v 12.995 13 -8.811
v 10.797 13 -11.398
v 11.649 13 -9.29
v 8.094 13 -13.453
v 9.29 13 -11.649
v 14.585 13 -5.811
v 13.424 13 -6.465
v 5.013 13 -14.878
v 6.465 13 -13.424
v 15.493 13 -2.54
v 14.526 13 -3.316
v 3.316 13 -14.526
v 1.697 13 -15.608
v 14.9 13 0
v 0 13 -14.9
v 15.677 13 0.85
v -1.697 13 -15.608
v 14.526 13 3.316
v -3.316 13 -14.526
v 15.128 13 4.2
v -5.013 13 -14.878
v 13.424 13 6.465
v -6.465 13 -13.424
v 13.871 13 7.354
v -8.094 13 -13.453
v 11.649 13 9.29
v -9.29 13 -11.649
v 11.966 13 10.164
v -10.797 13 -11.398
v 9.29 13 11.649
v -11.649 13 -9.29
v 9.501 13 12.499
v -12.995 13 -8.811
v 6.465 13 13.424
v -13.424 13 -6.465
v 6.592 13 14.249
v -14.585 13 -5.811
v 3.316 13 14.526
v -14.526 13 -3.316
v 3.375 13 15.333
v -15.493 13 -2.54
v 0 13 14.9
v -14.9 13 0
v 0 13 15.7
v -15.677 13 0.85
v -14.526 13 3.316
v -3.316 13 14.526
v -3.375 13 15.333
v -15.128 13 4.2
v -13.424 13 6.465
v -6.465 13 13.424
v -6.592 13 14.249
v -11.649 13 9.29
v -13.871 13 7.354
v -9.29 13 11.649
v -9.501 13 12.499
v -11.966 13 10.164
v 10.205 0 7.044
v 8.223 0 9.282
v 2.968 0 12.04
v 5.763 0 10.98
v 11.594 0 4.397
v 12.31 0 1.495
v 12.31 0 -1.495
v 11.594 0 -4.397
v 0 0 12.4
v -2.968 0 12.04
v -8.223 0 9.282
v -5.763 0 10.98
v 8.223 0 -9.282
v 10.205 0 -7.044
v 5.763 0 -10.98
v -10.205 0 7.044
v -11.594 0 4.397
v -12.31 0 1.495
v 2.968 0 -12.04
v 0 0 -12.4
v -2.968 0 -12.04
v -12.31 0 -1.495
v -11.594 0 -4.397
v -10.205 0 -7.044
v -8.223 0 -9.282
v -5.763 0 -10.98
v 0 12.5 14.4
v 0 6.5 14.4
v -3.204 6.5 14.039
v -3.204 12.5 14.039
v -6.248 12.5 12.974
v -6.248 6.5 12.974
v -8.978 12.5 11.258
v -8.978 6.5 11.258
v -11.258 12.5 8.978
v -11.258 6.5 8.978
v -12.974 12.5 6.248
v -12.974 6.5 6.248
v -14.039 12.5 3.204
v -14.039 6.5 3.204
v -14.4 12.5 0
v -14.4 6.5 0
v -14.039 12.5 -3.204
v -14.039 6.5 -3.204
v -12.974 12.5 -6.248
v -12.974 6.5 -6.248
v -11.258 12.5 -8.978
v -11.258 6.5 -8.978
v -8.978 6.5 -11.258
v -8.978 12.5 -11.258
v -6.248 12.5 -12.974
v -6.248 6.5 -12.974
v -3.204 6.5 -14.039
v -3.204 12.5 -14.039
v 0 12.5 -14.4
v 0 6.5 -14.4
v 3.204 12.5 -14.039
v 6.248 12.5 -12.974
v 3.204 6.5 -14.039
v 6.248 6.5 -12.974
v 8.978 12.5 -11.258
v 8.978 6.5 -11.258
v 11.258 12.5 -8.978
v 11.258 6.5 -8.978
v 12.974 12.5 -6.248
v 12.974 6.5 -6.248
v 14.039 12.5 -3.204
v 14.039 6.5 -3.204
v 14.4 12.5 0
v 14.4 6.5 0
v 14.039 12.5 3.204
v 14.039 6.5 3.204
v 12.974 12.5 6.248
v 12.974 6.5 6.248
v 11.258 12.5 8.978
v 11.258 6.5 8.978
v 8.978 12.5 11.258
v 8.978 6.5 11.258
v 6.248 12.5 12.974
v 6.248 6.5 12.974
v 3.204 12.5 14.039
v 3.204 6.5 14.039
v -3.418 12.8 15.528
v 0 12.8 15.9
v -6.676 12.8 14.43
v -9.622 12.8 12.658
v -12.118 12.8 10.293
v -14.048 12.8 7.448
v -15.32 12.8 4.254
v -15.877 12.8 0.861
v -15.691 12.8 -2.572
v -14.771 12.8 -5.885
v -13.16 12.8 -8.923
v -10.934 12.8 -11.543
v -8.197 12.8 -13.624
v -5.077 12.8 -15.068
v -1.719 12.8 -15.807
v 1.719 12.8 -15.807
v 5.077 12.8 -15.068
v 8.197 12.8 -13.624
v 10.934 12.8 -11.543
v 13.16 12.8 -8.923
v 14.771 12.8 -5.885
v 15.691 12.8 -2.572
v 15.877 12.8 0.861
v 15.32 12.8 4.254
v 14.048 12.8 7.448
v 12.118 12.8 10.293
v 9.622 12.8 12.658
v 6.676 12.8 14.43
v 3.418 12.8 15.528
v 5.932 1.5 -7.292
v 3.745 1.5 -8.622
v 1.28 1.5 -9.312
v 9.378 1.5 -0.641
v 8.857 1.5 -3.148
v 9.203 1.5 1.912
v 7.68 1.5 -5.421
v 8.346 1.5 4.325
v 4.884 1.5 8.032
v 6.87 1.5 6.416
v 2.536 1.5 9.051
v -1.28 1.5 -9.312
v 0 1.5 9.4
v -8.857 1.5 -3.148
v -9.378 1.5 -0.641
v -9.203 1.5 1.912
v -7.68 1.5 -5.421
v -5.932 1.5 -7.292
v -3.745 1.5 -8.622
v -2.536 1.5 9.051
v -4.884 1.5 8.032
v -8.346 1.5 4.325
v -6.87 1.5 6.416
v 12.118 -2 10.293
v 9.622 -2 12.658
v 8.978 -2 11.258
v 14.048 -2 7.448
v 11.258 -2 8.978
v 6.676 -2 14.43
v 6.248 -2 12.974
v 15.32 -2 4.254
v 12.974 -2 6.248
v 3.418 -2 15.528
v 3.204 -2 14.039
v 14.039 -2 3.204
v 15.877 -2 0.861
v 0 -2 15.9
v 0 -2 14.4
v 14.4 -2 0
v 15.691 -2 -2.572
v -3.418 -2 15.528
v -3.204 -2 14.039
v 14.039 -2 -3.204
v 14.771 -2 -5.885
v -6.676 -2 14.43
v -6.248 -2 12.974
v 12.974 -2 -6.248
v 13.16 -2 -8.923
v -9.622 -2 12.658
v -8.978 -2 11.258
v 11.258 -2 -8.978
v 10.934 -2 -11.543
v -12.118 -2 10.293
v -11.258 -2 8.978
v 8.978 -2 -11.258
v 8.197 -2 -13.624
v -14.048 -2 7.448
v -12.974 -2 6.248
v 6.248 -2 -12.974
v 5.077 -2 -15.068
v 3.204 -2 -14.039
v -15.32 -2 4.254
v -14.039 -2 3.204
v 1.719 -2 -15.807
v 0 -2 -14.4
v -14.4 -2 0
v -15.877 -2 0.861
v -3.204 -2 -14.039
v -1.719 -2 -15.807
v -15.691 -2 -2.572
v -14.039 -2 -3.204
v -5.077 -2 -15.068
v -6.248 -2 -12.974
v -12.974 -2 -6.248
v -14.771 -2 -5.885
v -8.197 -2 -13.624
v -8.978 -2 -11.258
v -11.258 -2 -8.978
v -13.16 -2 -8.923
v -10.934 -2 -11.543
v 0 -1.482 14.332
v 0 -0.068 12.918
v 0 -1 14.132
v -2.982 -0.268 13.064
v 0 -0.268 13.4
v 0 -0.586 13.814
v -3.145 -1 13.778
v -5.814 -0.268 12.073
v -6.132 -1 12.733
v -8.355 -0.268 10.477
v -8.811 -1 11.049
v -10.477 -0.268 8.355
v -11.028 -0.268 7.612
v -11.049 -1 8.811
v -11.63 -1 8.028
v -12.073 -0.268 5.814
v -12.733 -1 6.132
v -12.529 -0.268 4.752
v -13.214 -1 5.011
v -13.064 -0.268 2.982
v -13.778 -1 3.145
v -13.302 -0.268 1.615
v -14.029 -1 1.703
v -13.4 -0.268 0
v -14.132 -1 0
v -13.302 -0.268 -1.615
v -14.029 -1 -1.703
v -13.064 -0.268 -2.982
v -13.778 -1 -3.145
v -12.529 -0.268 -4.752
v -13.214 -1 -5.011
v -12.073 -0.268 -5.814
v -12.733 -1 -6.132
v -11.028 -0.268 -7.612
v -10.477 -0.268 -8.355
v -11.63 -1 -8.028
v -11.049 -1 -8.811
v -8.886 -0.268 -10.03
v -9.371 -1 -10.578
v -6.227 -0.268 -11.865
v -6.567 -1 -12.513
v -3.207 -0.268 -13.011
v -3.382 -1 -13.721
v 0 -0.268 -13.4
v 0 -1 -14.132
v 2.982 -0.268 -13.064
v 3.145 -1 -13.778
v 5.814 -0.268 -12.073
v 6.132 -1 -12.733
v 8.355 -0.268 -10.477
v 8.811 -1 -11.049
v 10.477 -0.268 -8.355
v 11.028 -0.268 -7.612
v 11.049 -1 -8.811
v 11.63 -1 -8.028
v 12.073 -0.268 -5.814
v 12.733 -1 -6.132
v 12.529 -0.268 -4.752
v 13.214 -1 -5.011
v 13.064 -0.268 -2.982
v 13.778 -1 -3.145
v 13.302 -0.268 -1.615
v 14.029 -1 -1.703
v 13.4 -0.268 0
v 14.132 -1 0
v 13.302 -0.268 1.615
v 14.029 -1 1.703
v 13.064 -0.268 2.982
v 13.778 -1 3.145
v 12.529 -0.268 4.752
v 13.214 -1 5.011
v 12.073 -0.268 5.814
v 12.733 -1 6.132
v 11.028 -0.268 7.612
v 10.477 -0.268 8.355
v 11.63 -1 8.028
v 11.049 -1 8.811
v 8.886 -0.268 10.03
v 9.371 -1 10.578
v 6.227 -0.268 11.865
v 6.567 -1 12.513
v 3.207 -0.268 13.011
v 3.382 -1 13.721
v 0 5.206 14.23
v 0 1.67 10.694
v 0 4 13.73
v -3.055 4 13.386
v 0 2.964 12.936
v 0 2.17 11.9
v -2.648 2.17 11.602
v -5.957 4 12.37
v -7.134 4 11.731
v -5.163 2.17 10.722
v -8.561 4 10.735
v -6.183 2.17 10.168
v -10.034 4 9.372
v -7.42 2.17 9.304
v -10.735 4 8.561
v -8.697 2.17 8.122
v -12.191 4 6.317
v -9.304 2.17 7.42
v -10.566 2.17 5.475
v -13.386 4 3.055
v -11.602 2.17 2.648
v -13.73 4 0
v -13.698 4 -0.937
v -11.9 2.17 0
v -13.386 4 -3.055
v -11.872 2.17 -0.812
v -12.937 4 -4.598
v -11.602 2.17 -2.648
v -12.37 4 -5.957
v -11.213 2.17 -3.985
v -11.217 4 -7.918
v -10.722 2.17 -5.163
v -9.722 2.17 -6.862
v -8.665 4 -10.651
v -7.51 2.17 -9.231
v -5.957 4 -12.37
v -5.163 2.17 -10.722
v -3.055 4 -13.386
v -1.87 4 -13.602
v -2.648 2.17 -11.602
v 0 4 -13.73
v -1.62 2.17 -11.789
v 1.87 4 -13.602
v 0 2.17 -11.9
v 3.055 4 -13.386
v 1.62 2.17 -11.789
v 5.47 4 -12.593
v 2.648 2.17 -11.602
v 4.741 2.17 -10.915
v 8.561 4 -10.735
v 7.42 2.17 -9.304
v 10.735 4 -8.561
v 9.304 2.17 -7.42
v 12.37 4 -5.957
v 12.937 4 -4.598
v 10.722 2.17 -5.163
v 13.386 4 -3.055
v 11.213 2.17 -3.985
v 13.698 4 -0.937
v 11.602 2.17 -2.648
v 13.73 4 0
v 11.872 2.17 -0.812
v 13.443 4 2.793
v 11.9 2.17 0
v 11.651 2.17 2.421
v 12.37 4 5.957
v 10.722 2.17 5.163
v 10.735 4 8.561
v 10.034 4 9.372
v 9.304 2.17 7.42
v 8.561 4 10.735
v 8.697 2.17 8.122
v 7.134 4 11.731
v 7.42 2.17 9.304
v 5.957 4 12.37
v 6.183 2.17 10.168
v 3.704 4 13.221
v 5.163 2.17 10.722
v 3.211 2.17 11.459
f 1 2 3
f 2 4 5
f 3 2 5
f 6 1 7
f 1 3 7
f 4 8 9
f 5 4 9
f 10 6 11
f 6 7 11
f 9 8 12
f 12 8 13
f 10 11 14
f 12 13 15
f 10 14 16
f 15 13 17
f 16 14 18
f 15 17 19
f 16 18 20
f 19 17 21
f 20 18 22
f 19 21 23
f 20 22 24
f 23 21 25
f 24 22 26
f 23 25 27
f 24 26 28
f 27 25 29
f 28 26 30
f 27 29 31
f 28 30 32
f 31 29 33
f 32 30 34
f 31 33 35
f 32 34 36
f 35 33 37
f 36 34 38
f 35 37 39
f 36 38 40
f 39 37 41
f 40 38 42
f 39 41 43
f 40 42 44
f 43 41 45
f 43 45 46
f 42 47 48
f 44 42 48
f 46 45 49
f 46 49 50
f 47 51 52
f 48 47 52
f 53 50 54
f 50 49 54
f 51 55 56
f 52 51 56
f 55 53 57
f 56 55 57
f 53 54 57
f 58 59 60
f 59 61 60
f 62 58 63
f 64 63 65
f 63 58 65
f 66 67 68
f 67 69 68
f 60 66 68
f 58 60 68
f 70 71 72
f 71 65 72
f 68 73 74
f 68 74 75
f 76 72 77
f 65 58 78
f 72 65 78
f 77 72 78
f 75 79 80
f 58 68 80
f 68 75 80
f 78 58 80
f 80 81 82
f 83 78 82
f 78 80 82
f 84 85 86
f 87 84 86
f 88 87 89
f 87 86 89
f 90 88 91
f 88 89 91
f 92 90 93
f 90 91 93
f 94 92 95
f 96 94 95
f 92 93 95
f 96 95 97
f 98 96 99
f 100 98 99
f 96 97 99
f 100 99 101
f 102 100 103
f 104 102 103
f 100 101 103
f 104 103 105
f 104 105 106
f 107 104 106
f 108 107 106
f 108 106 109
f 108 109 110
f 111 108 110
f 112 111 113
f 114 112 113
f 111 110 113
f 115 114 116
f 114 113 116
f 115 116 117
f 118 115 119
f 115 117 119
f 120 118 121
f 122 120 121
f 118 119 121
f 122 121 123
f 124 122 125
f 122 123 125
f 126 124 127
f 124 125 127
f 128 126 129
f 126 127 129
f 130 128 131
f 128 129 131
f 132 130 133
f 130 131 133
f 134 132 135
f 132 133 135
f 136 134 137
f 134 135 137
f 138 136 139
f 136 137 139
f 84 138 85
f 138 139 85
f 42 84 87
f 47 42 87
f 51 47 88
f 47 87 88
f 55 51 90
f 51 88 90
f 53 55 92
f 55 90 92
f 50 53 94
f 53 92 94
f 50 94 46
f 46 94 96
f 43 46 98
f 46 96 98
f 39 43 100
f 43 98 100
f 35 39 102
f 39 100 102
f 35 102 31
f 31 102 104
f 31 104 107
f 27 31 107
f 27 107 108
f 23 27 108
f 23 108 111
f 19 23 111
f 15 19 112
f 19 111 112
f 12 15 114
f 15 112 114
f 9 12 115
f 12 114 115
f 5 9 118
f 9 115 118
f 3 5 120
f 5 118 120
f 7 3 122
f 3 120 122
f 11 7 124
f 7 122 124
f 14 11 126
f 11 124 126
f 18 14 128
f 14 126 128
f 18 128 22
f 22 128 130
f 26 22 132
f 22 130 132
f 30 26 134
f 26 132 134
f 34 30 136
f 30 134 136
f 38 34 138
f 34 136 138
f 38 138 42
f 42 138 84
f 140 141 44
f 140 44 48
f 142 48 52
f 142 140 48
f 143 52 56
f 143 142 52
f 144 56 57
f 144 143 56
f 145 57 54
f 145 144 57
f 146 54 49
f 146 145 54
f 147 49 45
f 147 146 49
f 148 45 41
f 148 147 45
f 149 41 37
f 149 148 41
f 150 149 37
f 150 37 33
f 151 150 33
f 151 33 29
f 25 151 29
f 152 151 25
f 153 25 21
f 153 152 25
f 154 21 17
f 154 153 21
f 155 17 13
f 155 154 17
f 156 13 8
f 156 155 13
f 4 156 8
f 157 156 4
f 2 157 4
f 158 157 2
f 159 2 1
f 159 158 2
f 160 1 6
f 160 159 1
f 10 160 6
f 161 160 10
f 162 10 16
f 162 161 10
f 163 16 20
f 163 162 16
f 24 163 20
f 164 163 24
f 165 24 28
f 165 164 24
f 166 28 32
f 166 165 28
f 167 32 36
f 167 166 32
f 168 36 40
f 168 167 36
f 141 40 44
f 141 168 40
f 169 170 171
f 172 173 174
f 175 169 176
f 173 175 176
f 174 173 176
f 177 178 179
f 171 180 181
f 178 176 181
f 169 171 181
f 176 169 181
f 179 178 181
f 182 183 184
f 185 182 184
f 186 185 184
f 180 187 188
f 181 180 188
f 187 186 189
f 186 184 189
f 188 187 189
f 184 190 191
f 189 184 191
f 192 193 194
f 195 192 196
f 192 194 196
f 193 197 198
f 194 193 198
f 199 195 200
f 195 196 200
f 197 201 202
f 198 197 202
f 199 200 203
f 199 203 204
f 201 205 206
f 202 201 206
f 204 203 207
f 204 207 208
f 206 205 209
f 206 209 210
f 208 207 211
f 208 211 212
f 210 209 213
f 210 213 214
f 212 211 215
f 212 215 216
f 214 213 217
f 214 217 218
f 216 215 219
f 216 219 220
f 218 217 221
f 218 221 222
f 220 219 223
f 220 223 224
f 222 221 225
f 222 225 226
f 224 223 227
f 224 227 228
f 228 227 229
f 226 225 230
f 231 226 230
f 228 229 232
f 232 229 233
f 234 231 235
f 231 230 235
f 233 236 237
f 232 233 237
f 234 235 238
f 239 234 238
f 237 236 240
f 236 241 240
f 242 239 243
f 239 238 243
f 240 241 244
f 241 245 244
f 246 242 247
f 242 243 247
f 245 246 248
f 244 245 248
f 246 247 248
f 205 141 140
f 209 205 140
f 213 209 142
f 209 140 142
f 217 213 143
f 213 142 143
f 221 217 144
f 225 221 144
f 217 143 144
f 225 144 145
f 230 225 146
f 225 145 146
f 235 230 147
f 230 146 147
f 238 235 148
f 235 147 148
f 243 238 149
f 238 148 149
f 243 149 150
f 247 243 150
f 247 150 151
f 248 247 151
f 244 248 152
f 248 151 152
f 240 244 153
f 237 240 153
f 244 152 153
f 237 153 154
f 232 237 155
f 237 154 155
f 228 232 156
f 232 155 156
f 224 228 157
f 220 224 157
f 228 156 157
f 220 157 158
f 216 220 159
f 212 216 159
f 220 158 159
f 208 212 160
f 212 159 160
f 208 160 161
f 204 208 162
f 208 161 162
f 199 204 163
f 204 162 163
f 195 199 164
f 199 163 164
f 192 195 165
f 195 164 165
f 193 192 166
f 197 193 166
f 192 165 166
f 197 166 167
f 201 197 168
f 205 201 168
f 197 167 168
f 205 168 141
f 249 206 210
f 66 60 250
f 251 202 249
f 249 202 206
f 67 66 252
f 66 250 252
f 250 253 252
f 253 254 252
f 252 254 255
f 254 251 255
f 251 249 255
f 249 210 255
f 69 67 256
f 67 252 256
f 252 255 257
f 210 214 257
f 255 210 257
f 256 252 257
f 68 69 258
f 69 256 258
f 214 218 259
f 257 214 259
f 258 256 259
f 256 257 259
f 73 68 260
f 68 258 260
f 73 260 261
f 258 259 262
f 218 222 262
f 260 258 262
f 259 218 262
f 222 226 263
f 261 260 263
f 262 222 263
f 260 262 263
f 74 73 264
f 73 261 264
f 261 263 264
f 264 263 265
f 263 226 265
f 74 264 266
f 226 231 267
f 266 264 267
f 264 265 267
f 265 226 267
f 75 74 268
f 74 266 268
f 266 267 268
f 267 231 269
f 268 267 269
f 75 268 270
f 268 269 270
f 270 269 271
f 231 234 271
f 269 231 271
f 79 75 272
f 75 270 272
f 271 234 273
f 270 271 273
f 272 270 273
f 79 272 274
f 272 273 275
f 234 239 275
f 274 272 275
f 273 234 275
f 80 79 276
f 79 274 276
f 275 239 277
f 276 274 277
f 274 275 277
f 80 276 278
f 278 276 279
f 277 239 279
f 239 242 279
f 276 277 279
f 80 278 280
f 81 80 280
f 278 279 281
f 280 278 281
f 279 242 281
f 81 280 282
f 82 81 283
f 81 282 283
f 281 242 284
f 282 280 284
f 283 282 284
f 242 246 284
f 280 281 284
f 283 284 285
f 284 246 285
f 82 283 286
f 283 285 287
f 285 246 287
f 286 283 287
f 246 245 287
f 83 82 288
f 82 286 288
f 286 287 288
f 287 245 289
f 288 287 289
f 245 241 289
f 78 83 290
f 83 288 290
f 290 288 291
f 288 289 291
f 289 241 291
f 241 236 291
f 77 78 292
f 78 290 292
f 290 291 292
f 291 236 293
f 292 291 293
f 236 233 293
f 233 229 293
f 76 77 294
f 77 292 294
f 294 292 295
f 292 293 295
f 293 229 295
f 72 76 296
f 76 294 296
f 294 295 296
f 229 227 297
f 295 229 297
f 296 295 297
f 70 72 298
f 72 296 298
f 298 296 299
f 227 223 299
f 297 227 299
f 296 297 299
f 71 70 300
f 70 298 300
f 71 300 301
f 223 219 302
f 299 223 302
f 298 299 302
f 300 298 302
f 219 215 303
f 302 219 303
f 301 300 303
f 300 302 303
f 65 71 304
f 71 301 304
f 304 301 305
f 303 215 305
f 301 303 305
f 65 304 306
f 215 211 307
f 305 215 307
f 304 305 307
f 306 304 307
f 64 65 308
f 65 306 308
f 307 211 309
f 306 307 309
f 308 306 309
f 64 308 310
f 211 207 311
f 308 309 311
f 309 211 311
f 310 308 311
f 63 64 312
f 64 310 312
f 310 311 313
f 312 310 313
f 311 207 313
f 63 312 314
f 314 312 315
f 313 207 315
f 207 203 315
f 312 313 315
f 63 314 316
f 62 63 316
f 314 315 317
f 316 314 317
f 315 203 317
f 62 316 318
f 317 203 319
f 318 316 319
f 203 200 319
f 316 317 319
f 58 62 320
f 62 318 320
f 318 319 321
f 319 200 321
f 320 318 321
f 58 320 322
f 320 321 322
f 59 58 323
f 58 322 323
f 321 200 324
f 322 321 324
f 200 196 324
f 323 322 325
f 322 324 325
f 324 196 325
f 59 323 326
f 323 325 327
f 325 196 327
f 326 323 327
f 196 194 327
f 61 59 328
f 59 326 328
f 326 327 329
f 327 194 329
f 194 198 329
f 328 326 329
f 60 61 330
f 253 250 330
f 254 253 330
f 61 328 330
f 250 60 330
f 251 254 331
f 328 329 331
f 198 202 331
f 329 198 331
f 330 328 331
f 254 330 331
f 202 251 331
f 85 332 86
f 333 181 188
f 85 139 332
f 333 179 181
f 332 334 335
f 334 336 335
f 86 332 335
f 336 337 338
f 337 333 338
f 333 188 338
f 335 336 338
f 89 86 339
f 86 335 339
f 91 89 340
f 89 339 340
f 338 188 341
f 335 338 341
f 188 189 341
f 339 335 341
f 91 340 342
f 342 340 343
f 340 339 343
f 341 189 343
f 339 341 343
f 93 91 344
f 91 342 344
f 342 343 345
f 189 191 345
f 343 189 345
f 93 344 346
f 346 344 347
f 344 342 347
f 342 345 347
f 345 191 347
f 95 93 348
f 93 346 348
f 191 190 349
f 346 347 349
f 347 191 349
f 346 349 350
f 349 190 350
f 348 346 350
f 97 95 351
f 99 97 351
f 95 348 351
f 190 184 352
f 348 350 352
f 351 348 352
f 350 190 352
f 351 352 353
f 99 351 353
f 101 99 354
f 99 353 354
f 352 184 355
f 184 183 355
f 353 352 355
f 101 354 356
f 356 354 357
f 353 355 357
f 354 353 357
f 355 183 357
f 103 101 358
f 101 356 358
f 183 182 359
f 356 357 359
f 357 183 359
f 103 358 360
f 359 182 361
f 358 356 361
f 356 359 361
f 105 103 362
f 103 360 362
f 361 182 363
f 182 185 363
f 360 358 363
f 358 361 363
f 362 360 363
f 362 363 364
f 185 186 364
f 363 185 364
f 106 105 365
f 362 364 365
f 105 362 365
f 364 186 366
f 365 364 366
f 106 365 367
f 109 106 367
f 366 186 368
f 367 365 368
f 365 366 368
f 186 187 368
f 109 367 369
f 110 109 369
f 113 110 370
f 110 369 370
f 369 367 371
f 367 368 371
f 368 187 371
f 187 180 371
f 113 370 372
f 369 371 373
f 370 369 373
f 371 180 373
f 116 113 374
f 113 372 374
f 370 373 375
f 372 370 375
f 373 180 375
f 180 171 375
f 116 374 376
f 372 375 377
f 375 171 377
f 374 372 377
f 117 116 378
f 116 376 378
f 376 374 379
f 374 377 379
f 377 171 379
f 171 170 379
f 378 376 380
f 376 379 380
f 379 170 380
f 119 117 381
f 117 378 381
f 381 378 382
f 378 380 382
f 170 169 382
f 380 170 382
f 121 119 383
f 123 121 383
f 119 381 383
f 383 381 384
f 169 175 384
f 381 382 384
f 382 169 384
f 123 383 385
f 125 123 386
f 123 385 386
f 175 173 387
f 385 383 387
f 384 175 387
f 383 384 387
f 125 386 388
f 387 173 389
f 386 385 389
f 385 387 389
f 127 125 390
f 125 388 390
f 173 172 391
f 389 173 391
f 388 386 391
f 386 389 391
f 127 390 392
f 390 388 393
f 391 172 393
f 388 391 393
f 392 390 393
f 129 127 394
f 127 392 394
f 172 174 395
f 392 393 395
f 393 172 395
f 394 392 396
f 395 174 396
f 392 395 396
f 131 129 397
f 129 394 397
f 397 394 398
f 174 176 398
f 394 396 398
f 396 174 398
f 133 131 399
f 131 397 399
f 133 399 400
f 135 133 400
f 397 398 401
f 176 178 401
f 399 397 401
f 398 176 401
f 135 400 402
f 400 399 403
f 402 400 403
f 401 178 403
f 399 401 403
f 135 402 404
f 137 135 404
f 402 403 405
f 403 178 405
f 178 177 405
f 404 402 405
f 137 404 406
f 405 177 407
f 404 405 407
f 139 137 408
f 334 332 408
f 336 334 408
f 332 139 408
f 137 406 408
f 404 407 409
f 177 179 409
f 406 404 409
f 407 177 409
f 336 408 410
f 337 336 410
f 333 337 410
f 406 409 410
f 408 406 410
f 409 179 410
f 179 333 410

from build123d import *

# Parameters (mm, degrees)
CHAMFER1_SIZE = 0.5
CHAMFER2_SIZE = 0.2


with BuildPart() as part:
    # Sketch1 → Revolve1 (revolve)
    with BuildSketch(Plane.XY, mode=Mode.PRIVATE) as revolve1_sk:
        with BuildLine():
            Line((0, 0), (-12.4, 0))
            ThreePointArc((-12.4, 0), (-13.814213562, -0.585786438), (-14.4, -2))
            Line((-14.4, -2), (-15.9, -2))
            Line((-15.9, -2), (-15.9, 13))
            Line((-15.9, 13), (-14.4, 13))
            Line((-14.4, 13), (-14.4, 6.5))
            ThreePointArc((-14.4, 6.5), (-12.935533906, 2.964466094), (-9.4, 1.5))
            Line((-9.4, 1.5), (0, 1.5))
            Line((0, 1.5), (0, 0))
        make_face()
    revolve(revolve1_sk.sketch.rotate(Axis((0, 1.5, 0), (0, -1, 0)), 270), axis=Axis((0, 1.5, 0), (0, -1, 0)))

    # Chamfer1
    chamfer1_edges = [part.edges().sort_by_distance(p)[0] for p in [
        (0, 13, -14.4),
    ]]
    chamfer(chamfer1_edges, length=CHAMFER1_SIZE)

    # Chamfer2
    chamfer2_edges = [part.edges().sort_by_distance(p)[0] for p in [
        (0, 13, -15.9),
    ]]
    chamfer(chamfer2_edges, length=CHAMFER2_SIZE)


solid = part.part
